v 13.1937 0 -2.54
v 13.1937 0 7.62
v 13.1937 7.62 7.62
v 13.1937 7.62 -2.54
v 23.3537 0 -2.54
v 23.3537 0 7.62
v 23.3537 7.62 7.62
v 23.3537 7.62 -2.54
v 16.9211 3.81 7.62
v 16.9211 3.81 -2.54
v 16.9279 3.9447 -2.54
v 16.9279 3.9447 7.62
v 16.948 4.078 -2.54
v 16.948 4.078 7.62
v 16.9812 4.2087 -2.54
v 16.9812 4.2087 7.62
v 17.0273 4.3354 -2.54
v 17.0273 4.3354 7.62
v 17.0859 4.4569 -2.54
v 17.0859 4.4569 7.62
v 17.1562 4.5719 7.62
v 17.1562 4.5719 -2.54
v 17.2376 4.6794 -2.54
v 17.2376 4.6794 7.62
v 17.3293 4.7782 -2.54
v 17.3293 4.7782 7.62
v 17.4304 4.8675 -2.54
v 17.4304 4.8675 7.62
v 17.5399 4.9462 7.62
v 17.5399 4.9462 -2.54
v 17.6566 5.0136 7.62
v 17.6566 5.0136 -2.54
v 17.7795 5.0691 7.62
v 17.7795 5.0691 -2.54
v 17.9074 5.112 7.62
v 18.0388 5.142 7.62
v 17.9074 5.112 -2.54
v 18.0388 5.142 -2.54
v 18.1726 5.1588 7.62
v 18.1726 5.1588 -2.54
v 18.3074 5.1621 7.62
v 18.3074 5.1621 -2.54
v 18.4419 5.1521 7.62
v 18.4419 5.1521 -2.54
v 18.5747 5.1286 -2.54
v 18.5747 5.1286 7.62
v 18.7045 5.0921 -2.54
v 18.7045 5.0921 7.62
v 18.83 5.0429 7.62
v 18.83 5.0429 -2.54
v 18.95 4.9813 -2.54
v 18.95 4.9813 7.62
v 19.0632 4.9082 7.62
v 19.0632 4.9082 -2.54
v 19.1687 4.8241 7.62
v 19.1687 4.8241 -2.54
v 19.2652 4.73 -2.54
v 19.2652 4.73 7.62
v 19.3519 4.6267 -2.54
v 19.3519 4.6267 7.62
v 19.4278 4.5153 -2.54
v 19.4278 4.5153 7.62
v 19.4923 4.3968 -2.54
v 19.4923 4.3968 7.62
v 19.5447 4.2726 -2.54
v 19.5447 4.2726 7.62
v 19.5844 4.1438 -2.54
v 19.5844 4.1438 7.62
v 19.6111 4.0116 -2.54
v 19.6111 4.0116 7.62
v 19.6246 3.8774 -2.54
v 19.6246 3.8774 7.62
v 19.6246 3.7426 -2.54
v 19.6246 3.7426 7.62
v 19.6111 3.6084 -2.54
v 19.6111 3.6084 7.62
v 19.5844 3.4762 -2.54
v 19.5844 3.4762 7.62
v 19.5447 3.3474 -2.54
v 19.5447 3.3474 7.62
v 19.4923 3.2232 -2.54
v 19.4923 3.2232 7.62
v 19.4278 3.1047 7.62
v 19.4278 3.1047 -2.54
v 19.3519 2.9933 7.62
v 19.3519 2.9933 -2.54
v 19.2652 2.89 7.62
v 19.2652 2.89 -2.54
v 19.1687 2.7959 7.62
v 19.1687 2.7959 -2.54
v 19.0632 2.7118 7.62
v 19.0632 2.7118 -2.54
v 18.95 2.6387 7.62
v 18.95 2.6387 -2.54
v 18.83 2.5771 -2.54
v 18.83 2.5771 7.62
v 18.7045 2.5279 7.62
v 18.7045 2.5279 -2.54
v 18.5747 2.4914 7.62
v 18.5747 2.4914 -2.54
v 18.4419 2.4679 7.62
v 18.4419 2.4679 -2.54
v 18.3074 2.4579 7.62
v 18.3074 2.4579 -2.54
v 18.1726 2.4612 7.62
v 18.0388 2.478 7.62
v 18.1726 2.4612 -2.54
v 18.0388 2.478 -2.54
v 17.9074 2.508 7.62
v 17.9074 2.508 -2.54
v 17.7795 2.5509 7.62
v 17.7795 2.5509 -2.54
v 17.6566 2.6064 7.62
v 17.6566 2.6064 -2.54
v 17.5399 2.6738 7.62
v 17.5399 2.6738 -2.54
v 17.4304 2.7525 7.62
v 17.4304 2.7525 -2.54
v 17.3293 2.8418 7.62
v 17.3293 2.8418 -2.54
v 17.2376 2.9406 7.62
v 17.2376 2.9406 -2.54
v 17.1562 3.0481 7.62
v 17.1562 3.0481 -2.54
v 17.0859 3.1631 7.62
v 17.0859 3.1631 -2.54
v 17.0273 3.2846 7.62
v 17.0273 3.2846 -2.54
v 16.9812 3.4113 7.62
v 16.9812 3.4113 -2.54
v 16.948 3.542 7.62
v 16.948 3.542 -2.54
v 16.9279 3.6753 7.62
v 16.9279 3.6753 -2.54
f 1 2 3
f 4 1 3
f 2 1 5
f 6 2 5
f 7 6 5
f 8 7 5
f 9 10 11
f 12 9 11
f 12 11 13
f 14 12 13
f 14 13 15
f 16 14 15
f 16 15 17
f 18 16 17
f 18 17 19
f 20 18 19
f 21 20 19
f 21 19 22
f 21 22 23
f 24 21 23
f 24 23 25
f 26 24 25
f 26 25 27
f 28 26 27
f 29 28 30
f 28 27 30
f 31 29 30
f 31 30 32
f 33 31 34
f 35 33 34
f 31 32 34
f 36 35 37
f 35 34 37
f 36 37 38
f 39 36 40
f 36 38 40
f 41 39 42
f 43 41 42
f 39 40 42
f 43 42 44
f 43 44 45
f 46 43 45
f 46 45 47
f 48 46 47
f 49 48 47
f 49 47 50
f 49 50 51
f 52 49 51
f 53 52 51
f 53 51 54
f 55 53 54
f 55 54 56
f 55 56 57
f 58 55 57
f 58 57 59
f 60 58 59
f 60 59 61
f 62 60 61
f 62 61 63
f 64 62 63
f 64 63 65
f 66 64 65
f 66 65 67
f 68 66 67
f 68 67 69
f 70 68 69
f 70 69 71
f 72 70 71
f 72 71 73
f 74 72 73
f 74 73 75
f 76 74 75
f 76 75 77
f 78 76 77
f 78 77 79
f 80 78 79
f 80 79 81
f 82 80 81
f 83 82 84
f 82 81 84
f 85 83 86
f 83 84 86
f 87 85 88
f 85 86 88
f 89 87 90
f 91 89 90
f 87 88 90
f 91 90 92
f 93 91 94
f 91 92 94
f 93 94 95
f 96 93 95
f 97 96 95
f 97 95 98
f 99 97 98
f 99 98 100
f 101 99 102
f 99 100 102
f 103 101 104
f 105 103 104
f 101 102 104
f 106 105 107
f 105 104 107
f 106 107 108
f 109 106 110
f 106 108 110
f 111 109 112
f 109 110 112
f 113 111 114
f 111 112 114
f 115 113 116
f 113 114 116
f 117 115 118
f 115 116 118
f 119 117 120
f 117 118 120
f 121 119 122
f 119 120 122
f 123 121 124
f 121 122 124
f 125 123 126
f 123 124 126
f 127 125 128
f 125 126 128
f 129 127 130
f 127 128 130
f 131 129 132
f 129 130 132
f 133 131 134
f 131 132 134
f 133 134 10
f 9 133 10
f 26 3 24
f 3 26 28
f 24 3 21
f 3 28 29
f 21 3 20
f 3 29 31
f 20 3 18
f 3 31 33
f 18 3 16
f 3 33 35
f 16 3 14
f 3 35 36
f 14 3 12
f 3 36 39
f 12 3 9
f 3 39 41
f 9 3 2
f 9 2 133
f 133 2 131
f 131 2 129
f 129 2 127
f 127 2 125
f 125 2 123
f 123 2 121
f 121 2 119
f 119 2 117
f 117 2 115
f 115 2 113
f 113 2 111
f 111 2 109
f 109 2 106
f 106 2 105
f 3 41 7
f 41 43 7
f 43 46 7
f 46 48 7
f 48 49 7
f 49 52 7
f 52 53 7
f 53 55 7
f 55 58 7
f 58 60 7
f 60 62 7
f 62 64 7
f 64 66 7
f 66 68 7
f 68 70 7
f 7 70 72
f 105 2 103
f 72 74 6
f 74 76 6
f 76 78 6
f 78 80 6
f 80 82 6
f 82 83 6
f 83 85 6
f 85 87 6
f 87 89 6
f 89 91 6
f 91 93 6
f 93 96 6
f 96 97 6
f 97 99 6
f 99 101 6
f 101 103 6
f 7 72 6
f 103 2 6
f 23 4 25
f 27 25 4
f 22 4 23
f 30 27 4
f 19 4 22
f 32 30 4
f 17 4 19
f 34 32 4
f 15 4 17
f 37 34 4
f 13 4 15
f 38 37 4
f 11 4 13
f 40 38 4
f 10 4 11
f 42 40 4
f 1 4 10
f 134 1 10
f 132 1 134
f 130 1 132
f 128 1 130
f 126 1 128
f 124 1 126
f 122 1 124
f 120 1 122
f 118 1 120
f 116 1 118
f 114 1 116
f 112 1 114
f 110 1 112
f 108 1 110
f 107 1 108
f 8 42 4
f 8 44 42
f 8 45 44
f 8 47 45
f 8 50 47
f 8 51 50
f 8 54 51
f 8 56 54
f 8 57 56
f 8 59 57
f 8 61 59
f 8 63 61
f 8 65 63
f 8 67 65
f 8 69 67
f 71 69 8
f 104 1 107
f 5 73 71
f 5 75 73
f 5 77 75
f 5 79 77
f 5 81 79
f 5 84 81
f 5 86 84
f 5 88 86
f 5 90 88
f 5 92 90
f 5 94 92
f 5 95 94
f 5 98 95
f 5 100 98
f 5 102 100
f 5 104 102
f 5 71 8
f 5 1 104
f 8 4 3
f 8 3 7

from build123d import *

# Parameters (mm, degrees)
SKETCH1_W             = 12.7
SKETCH1_H             = 10.16
BOSS_EXTRUDE1_DEPTH   = 7.62
SKETCH11_W            = 2.54
SKETCH11_H            = 7.62
CUT_EXTRUDE1_DEPTH    = 27.583545687
F_6_32_TAPPED_HOLE1_D = 2.7051


with BuildPart() as part:
    # Sketch1 → Boss-Extrude1 (new body)
    with BuildSketch(Plane(origin=(0, 0, 0), x_dir=(1, 0, 0), z_dir=(0, 1, 0))):
        with Locations((17.003691385, -2.54)):
            Rectangle(SKETCH1_W, SKETCH1_H)
    extrude(amount=BOSS_EXTRUDE1_DEPTH)

    # Sketch11 → Cut-Extrude1 (cut, through all)
    with BuildSketch(Plane.XY.offset(7.62)):
        with Locations((11.923691385, 3.81)):
            Rectangle(SKETCH11_W, SKETCH11_H)
    extrude(amount=-CUT_EXTRUDE1_DEPTH, mode=Mode.SUBTRACT)

    # #6-32 Tapped Hole1 (through all)
    with Locations(Plane.XY.offset(7.62)):
        with Locations((18.273691385, 3.81)):
            Hole(F_6_32_TAPPED_HOLE1_D / 2)


solid = part.part
